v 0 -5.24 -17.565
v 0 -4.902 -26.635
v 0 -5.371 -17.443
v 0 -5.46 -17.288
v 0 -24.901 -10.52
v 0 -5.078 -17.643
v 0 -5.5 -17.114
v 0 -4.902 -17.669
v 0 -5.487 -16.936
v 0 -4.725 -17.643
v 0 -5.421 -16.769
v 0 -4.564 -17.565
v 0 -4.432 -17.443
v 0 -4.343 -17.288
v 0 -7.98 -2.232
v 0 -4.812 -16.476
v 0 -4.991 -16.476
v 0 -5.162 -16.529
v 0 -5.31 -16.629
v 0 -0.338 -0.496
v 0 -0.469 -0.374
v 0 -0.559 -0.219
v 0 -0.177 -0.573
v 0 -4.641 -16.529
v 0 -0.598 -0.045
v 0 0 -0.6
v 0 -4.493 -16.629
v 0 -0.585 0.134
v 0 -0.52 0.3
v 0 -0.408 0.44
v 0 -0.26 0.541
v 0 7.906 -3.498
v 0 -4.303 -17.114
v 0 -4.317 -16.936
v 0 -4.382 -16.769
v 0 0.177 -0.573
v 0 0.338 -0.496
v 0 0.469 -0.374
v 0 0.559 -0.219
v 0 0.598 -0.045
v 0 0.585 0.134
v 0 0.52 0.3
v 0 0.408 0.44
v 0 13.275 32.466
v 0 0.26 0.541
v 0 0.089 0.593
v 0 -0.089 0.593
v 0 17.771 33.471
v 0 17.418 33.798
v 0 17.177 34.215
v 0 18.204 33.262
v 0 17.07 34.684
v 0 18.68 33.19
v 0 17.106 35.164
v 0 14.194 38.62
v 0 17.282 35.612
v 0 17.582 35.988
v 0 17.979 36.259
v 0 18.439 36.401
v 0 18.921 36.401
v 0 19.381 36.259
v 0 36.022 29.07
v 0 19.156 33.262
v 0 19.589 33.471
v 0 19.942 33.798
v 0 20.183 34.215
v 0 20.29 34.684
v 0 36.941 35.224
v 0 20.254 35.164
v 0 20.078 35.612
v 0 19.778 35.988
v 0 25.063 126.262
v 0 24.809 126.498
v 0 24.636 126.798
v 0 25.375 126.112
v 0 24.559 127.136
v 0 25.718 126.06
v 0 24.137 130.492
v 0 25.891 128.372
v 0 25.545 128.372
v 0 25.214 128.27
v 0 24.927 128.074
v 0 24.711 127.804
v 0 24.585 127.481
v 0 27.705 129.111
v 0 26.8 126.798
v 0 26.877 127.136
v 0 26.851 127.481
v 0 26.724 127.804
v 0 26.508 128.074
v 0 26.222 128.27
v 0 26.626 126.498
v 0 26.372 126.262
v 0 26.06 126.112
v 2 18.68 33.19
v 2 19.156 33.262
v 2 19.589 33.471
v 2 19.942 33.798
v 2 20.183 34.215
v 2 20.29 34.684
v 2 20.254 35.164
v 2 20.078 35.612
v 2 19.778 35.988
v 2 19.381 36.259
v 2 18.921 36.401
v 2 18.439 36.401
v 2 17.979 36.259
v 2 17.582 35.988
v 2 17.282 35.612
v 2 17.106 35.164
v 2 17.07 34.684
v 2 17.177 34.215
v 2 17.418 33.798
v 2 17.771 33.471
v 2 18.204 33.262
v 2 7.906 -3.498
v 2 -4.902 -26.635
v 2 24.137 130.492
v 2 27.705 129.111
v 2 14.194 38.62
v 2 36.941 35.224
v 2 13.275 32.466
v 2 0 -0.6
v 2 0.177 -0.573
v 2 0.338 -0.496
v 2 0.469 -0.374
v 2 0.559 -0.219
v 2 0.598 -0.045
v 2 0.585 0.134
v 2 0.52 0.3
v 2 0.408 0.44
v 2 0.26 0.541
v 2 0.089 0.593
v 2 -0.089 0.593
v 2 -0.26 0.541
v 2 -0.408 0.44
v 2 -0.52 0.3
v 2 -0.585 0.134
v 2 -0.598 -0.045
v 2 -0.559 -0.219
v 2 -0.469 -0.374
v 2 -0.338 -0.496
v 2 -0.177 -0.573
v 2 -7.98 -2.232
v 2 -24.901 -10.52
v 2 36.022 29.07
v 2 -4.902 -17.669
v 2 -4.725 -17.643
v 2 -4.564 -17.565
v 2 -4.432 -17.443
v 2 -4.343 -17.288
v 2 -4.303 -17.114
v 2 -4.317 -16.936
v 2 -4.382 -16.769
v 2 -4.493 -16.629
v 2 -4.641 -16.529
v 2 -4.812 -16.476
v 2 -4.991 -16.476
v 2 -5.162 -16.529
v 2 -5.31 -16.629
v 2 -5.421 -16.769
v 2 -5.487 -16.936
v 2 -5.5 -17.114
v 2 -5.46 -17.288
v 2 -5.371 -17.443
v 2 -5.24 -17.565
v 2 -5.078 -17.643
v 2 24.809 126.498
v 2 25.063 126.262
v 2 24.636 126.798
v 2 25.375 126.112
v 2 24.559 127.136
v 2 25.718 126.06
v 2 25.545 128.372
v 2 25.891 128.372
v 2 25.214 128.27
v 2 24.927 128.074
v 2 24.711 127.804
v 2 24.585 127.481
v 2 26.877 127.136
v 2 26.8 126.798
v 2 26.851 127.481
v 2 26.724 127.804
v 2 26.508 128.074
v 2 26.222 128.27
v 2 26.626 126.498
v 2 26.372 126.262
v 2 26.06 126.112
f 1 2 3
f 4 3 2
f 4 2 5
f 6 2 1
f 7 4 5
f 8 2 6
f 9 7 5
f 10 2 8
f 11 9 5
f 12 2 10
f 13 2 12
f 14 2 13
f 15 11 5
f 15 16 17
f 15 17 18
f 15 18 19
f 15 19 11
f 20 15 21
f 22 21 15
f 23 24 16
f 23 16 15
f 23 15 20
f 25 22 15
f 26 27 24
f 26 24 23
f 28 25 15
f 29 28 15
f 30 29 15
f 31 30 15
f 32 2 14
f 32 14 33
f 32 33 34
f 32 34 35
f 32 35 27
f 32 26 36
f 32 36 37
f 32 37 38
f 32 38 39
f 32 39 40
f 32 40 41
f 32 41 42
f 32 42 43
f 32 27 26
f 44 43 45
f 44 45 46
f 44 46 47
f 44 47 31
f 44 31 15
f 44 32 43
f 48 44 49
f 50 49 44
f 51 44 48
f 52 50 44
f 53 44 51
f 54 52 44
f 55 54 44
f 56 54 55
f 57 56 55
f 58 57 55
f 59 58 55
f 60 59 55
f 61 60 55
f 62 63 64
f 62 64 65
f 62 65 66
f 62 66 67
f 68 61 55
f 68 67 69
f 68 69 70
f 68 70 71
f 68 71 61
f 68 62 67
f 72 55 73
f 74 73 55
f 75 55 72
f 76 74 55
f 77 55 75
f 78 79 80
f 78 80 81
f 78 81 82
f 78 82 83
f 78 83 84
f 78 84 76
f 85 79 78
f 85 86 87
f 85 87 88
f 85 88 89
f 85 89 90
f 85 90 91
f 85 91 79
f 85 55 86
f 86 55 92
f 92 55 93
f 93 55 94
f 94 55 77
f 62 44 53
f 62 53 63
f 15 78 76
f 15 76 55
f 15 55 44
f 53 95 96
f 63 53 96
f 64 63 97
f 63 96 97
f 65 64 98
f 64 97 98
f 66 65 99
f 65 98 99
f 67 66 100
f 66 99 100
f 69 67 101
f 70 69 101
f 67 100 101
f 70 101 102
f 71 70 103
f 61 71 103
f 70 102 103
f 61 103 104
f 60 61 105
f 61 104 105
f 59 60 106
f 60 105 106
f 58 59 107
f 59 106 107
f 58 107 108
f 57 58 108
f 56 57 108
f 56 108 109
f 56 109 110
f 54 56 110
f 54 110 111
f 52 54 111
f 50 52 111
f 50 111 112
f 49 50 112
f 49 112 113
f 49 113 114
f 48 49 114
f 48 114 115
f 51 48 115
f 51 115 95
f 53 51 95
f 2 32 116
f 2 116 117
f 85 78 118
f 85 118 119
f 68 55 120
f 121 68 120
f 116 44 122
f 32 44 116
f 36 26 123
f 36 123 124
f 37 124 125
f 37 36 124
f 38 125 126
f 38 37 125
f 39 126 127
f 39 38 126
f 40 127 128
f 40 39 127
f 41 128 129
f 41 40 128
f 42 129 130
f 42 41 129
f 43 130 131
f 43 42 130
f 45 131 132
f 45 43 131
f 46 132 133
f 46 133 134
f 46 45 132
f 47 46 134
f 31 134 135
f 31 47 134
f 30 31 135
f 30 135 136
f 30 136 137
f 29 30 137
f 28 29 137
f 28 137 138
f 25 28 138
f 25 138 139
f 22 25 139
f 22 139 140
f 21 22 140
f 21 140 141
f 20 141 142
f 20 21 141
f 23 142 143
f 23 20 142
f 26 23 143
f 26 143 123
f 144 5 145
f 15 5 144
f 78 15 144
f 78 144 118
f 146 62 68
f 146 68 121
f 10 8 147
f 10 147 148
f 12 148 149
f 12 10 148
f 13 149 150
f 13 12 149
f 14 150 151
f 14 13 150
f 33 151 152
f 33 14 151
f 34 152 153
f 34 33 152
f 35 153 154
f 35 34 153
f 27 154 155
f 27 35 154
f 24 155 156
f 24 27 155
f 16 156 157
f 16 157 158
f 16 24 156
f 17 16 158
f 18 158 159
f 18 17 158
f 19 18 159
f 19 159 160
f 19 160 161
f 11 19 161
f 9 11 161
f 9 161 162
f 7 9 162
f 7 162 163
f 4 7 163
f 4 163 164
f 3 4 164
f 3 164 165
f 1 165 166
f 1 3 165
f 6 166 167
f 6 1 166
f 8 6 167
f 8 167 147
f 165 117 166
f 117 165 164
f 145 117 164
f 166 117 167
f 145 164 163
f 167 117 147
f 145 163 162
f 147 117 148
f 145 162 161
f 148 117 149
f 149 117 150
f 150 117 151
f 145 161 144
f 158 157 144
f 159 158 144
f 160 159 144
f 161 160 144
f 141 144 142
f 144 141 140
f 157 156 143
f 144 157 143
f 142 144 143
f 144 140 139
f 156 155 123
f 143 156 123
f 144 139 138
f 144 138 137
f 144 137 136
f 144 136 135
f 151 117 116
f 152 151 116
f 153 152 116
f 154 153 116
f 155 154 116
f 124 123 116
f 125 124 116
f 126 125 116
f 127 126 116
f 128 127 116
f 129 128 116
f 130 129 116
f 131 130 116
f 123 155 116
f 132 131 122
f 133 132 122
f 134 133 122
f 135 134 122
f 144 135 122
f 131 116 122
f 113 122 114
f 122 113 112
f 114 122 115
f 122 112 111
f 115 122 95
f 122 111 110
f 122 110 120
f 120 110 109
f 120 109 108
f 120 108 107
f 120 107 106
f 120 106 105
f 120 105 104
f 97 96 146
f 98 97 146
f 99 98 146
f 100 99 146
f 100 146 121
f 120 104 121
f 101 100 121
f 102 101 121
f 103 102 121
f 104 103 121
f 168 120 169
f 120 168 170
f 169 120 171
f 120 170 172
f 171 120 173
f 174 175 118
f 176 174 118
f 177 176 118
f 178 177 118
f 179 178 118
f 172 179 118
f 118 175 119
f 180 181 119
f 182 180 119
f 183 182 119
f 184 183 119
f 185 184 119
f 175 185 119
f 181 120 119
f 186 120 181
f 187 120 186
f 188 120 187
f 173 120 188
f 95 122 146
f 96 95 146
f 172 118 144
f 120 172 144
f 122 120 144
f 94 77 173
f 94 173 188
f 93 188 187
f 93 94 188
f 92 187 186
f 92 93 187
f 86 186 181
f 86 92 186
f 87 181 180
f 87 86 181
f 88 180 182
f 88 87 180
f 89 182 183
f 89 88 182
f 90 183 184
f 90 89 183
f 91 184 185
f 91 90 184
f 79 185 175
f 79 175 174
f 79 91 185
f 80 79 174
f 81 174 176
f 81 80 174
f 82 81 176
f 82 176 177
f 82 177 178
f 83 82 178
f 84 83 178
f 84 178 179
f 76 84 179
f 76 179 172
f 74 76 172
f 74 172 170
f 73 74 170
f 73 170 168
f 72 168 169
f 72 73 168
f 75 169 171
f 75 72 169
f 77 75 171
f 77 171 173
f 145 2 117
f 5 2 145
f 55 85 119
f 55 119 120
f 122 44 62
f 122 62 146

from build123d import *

# Parameters (mm, degrees)
SKETCH_1_R          = 0.6
SKETCH_1_R_2        = 1.16208208
EXTRUDE_1_DEPTH     = 2
SKETCH_2_W          = 2
SKETCH_2_H          = 6.221940724
EXTRUDE_2_DEPTH     = 22.998818
SKETCH_3_R          = 1.614508757
CUT_EXTRUDE_1_DEPTH = 136.634989839


with BuildPart() as part:
    # 草图1 → 凸台-拉伸1 (new body)
    with BuildSketch(Plane(origin=(0, 0, 0), x_dir=(0, 0, -1), z_dir=(1, 0, 0))):
        Polygon((-129.110885337, 27.705001714), (3.4977294, 7.905798819), (26.635169992, -4.901598114), (10.519539729, -24.901019931), (2.231501308, -7.979608155), (-130.492225074, 24.136540727), align=None)
        Circle(SKETCH_1_R, mode=Mode.SUBTRACT)
        with Locations((17.069222108, -4.901598114)):
            Circle(SKETCH_1_R, mode=Mode.SUBTRACT)
        with Locations((-127.222518318, 25.717836253)):
            Circle(SKETCH_1_R_2, mode=Mode.SUBTRACT)
    extrude(amount=EXTRUDE_1_DEPTH)

    # 草图2 → 凸台-拉伸2 (add)
    with BuildSketch(Plane(origin=(0, 8.244247262, -1.230911918), x_dir=(1, 0, 0), z_dir=(0, 0.9890368823707517, -0.14766870118729958))):
        with Locations((1, -37.181709338)):
            Rectangle(SKETCH_2_W, SKETCH_2_H)
    extrude(amount=EXTRUDE_2_DEPTH)

    # 草图3 → 切除-拉伸1 (cut, through all)
    with BuildSketch(Plane(origin=(2, 0, 0), x_dir=(0, 0, -1), z_dir=(1, 0, 0))):
        with Locations((-34.804826462, 18.6800064)):
            Circle(SKETCH_3_R)
    extrude(amount=-CUT_EXTRUDE_1_DEPTH, mode=Mode.SUBTRACT)


solid = part.part
